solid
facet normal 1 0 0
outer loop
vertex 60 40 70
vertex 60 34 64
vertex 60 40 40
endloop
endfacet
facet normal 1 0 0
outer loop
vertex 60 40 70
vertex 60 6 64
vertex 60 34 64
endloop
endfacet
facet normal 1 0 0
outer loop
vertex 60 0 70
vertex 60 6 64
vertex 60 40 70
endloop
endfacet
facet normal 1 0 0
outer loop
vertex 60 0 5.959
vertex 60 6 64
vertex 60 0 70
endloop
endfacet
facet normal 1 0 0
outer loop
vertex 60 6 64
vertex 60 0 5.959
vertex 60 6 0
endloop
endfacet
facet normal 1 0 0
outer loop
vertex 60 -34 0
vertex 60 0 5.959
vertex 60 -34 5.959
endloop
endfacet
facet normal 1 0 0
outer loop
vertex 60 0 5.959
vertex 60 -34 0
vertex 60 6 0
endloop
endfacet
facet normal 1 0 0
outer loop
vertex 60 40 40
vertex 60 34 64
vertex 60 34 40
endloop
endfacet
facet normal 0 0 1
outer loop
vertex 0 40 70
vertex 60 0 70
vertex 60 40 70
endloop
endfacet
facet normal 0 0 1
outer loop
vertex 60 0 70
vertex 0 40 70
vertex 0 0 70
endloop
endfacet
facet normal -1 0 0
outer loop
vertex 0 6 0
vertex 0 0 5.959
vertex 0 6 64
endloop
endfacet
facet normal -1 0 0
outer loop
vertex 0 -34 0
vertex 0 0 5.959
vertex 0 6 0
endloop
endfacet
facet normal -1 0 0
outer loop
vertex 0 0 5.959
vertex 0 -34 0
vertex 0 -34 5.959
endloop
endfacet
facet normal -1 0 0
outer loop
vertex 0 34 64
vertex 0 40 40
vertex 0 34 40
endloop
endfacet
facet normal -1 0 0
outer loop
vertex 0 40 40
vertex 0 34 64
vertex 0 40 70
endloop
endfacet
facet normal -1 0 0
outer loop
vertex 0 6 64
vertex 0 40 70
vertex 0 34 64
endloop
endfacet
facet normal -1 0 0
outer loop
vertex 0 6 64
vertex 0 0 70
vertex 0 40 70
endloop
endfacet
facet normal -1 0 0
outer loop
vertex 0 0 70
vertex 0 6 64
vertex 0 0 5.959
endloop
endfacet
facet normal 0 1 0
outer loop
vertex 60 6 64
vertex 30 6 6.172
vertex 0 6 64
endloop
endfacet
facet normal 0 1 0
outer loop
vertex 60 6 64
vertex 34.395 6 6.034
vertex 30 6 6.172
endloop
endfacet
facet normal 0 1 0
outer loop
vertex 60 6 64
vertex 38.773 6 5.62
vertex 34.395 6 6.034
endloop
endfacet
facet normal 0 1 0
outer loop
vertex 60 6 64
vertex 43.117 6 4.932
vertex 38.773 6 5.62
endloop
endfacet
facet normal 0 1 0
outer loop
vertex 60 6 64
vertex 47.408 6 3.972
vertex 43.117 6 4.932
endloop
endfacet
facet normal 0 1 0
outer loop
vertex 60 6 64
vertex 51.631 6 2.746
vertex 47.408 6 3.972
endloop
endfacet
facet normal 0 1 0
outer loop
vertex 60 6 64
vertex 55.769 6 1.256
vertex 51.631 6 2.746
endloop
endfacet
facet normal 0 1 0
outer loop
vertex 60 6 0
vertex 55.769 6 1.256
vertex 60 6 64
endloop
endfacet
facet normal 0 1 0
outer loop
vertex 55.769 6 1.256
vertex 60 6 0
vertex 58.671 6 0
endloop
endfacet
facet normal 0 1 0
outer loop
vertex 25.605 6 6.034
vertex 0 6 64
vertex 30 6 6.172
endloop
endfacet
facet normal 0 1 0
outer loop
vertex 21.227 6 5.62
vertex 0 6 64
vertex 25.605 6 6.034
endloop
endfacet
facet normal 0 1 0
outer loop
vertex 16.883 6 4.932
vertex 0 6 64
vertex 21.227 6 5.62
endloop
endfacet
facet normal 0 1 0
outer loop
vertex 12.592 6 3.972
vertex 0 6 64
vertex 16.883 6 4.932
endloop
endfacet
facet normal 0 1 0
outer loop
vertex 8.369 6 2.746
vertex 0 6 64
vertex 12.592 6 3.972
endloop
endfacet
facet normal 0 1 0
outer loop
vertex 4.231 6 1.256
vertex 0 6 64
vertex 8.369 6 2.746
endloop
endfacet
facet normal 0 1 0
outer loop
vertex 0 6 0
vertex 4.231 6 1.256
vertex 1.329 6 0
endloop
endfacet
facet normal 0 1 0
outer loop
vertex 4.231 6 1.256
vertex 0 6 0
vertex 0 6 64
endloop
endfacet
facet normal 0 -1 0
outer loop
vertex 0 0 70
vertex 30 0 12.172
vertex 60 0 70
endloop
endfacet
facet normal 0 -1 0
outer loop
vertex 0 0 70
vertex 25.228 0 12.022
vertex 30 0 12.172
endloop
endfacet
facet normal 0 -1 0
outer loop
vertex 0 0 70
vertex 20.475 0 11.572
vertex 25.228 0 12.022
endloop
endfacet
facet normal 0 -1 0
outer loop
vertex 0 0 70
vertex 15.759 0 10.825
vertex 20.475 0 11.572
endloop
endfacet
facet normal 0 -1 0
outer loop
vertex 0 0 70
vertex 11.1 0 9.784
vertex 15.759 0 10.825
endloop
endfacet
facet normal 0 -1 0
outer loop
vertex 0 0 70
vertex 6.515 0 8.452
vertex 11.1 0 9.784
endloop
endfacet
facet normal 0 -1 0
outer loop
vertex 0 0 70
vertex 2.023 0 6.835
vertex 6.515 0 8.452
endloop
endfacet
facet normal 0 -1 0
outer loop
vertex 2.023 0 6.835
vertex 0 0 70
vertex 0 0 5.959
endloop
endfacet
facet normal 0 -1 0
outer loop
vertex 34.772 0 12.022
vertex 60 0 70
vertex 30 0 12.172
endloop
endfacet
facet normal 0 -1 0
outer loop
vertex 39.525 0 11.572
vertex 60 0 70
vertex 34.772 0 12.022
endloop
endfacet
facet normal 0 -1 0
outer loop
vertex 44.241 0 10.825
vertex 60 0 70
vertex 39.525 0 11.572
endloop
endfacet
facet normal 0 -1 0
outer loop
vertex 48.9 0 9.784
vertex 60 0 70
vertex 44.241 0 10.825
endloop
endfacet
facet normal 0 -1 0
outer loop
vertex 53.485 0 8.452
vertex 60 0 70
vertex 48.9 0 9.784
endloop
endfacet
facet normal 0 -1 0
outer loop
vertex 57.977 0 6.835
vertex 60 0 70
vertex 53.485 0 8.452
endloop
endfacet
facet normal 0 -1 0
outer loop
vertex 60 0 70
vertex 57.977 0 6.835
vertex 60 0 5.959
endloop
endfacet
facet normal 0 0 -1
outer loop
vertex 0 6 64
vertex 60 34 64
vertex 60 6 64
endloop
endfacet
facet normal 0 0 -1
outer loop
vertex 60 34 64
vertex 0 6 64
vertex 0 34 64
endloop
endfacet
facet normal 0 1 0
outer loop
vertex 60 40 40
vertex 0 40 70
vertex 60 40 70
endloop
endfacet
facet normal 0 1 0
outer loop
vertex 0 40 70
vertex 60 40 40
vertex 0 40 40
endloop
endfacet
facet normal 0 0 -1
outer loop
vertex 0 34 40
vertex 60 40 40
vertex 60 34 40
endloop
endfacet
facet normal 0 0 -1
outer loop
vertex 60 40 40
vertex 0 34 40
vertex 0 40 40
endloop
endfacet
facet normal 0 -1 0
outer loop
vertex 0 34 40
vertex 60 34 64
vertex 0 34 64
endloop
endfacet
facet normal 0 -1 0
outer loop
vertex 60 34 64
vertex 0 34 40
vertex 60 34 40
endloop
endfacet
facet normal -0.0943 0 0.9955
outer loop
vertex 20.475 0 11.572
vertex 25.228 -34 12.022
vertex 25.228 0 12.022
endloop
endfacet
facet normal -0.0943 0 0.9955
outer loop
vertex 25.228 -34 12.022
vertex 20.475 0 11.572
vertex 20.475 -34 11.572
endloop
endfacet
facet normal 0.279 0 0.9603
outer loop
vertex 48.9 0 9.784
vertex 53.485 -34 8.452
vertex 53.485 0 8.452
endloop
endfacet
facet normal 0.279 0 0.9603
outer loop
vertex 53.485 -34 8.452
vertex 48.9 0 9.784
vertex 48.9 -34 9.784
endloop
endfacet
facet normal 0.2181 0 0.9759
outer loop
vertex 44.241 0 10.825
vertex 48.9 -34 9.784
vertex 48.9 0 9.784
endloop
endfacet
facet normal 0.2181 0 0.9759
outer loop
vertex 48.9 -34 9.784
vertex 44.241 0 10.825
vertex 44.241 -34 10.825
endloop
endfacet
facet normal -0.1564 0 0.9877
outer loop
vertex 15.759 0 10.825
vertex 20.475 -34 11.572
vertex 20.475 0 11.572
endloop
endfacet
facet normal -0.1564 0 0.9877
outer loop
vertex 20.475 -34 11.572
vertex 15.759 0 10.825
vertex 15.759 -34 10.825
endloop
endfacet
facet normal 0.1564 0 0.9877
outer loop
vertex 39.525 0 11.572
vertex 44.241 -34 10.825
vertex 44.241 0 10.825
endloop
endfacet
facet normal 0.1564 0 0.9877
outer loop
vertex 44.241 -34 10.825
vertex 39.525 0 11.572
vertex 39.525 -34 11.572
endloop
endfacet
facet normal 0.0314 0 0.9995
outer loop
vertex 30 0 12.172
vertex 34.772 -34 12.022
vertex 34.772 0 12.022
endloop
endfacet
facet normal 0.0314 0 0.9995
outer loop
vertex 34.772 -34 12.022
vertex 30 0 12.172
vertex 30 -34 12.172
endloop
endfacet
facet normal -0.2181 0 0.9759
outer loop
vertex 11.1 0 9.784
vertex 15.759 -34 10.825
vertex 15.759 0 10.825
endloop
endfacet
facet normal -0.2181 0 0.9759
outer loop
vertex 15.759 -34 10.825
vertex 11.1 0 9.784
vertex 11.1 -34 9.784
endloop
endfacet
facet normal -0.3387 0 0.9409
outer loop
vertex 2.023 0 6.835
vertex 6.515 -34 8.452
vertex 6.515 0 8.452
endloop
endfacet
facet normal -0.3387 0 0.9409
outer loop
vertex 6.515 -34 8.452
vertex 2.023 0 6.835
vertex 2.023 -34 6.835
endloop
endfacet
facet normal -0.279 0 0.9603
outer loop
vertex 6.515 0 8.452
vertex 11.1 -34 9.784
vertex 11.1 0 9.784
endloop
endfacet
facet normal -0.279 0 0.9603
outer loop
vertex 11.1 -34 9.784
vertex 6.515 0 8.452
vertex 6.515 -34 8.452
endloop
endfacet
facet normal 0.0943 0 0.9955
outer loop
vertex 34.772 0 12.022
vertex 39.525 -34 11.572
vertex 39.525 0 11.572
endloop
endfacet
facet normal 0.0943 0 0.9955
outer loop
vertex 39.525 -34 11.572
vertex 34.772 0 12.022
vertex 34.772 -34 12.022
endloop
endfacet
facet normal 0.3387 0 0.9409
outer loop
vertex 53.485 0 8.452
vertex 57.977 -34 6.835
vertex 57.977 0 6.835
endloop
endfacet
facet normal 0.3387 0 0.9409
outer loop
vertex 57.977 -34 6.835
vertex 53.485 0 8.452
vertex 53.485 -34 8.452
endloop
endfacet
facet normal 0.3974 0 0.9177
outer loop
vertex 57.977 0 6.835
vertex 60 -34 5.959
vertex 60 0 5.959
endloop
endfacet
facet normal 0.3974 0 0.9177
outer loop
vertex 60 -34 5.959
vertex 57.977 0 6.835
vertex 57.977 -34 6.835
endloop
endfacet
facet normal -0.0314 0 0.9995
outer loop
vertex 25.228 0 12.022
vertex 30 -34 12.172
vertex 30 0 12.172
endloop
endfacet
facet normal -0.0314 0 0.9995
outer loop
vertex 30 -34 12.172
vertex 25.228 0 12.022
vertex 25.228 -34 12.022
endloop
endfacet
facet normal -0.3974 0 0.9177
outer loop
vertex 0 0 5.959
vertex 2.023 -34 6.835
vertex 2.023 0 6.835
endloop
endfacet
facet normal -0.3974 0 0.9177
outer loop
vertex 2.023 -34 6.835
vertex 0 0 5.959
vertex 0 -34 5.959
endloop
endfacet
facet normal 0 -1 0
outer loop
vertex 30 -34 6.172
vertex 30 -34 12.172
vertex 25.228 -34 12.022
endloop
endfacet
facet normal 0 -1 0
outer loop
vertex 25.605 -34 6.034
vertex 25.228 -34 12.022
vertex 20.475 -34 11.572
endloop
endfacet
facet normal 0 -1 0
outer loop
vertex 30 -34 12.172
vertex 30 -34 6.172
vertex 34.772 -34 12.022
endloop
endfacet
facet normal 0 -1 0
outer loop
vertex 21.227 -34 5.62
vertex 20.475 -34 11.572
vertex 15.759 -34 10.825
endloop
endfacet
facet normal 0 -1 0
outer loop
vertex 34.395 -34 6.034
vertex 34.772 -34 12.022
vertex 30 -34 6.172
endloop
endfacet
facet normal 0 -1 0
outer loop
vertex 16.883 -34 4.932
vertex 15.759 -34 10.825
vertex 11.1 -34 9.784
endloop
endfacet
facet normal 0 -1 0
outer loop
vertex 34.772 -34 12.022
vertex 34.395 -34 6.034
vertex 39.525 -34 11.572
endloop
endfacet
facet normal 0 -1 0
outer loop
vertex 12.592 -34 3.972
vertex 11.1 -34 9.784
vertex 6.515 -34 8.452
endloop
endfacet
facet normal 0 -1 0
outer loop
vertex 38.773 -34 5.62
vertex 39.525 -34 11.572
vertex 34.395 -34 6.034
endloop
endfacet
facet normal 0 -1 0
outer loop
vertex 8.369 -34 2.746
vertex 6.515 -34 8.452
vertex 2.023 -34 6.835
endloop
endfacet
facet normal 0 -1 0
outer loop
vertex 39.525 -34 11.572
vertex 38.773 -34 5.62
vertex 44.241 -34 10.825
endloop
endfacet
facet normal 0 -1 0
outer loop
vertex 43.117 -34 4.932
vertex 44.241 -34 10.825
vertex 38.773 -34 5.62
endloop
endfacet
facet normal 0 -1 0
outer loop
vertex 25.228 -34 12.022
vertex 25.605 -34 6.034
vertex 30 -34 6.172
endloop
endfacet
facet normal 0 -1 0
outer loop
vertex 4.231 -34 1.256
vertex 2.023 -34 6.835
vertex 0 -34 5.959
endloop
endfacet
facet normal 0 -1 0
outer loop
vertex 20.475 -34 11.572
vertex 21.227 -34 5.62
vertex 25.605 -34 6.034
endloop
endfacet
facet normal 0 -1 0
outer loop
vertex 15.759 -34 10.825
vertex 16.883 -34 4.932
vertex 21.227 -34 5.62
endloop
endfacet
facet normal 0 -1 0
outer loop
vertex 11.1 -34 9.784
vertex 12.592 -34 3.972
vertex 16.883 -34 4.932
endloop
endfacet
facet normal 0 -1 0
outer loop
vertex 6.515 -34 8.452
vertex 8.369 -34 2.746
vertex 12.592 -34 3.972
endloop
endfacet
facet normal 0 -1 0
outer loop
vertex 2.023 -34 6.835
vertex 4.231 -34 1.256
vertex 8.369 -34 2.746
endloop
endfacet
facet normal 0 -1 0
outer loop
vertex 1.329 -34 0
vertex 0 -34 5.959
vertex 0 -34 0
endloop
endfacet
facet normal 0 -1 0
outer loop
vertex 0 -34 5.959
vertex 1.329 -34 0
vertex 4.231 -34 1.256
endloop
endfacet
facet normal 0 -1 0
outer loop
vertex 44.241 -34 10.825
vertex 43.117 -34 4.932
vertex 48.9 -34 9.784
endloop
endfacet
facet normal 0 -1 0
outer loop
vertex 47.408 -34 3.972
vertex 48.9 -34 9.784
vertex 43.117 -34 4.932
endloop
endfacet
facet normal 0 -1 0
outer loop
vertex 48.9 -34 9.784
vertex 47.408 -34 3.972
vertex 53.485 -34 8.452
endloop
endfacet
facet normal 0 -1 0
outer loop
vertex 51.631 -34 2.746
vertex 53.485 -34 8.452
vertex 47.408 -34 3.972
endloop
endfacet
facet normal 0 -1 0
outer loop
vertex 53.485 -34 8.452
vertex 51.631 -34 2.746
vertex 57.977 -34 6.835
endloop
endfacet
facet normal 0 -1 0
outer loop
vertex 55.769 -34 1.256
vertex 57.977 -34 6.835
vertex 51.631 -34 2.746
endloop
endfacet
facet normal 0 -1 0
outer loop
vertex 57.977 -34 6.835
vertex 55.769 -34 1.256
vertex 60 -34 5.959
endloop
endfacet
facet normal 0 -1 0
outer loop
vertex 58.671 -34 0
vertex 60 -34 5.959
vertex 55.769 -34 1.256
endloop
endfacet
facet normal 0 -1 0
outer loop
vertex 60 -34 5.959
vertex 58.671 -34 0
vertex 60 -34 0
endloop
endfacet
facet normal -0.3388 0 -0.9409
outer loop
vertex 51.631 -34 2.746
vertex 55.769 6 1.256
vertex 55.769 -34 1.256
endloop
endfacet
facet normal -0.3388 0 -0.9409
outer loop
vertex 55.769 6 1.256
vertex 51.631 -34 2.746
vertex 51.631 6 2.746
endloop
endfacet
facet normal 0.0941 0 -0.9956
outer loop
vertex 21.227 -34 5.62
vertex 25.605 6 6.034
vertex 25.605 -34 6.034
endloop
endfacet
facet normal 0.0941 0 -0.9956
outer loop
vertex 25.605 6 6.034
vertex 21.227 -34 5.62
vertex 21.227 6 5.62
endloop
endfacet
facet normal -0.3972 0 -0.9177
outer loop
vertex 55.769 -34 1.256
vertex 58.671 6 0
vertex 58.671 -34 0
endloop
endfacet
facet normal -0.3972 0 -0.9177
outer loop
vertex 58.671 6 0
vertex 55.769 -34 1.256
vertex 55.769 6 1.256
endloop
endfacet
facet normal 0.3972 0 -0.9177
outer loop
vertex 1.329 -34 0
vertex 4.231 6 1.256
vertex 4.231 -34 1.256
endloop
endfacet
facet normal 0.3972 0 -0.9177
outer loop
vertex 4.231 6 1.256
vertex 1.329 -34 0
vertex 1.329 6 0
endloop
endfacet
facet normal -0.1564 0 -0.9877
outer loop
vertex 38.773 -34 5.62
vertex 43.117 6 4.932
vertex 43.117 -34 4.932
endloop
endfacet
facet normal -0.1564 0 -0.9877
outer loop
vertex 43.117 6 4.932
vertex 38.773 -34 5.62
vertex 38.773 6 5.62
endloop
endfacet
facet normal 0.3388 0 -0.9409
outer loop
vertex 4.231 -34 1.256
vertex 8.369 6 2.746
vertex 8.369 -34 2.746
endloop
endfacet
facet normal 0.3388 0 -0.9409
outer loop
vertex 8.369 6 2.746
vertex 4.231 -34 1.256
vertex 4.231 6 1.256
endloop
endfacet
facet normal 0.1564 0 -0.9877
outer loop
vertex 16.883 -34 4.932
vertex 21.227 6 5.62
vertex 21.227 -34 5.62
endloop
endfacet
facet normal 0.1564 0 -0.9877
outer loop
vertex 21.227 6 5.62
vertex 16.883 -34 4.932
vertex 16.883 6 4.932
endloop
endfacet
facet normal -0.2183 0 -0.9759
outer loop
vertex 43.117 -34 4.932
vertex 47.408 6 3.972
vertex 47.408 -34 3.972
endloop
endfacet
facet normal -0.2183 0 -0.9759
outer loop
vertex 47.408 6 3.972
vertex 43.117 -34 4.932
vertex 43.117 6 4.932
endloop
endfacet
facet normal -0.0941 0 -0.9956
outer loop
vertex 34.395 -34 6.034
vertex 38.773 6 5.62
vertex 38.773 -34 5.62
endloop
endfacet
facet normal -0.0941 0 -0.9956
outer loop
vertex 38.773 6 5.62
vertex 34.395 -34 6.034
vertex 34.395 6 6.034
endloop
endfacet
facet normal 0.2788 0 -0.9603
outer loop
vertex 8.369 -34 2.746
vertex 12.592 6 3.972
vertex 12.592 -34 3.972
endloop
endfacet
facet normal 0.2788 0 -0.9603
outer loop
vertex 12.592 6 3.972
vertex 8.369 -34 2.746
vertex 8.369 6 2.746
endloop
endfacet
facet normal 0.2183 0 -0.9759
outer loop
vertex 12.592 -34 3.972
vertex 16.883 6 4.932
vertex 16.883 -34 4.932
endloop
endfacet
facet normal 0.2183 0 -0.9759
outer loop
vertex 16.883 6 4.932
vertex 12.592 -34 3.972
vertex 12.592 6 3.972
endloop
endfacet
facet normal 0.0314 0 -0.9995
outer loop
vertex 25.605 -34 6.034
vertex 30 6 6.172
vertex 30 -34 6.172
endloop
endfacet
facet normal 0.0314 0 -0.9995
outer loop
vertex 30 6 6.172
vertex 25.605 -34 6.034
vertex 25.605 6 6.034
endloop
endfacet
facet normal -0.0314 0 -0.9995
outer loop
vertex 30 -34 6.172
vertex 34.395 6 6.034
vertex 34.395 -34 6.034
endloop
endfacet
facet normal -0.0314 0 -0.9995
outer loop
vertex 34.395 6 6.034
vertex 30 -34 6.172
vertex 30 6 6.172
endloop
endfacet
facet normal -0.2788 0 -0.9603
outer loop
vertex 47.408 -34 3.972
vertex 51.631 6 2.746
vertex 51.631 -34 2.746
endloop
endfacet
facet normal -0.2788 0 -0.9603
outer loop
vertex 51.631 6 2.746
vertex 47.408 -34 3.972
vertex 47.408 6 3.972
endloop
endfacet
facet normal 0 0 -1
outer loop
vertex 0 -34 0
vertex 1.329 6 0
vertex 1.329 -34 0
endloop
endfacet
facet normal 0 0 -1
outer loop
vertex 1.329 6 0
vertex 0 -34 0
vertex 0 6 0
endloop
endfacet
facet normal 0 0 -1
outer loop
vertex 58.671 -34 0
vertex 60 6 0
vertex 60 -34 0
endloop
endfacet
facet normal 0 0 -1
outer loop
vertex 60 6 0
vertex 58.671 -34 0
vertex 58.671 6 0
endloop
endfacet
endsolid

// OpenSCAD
$fn=100;

radius = 70;
height = 70;
//width = height/1.61;
width = 60;
thickness = 6;
translateR = sqrt((radius+thickness)*(radius+thickness)-(width*width/4))-thickness;


intersection(){
	translate([0,-200,0]){
		cube([width,400,400],false);
	}
	difference(){
		union(){
			cube([width,thickness,height]);
			translate([0,0,height-thickness]){
				cube([width,40,thickness]);
			};
			translate([0,40-thickness,height-30]){
//			minkowski()
//			{
					cube([width, thickness, 30]);
//				rotate([00,90,90]){
//					cylinder(r=3,h=3);
//				}
//			}
			};
			translate([width/2,thickness,-translateR]){
				rotate([90,0,0]){
					cylinder(40, (radius+thickness),(radius+thickness), false);
				}
			}
		}

		translate([width/2,7,-translateR]){
			rotate([90,0,0]){
				cylinder(48,radius,radius,false);
			}
		}
	}
}
